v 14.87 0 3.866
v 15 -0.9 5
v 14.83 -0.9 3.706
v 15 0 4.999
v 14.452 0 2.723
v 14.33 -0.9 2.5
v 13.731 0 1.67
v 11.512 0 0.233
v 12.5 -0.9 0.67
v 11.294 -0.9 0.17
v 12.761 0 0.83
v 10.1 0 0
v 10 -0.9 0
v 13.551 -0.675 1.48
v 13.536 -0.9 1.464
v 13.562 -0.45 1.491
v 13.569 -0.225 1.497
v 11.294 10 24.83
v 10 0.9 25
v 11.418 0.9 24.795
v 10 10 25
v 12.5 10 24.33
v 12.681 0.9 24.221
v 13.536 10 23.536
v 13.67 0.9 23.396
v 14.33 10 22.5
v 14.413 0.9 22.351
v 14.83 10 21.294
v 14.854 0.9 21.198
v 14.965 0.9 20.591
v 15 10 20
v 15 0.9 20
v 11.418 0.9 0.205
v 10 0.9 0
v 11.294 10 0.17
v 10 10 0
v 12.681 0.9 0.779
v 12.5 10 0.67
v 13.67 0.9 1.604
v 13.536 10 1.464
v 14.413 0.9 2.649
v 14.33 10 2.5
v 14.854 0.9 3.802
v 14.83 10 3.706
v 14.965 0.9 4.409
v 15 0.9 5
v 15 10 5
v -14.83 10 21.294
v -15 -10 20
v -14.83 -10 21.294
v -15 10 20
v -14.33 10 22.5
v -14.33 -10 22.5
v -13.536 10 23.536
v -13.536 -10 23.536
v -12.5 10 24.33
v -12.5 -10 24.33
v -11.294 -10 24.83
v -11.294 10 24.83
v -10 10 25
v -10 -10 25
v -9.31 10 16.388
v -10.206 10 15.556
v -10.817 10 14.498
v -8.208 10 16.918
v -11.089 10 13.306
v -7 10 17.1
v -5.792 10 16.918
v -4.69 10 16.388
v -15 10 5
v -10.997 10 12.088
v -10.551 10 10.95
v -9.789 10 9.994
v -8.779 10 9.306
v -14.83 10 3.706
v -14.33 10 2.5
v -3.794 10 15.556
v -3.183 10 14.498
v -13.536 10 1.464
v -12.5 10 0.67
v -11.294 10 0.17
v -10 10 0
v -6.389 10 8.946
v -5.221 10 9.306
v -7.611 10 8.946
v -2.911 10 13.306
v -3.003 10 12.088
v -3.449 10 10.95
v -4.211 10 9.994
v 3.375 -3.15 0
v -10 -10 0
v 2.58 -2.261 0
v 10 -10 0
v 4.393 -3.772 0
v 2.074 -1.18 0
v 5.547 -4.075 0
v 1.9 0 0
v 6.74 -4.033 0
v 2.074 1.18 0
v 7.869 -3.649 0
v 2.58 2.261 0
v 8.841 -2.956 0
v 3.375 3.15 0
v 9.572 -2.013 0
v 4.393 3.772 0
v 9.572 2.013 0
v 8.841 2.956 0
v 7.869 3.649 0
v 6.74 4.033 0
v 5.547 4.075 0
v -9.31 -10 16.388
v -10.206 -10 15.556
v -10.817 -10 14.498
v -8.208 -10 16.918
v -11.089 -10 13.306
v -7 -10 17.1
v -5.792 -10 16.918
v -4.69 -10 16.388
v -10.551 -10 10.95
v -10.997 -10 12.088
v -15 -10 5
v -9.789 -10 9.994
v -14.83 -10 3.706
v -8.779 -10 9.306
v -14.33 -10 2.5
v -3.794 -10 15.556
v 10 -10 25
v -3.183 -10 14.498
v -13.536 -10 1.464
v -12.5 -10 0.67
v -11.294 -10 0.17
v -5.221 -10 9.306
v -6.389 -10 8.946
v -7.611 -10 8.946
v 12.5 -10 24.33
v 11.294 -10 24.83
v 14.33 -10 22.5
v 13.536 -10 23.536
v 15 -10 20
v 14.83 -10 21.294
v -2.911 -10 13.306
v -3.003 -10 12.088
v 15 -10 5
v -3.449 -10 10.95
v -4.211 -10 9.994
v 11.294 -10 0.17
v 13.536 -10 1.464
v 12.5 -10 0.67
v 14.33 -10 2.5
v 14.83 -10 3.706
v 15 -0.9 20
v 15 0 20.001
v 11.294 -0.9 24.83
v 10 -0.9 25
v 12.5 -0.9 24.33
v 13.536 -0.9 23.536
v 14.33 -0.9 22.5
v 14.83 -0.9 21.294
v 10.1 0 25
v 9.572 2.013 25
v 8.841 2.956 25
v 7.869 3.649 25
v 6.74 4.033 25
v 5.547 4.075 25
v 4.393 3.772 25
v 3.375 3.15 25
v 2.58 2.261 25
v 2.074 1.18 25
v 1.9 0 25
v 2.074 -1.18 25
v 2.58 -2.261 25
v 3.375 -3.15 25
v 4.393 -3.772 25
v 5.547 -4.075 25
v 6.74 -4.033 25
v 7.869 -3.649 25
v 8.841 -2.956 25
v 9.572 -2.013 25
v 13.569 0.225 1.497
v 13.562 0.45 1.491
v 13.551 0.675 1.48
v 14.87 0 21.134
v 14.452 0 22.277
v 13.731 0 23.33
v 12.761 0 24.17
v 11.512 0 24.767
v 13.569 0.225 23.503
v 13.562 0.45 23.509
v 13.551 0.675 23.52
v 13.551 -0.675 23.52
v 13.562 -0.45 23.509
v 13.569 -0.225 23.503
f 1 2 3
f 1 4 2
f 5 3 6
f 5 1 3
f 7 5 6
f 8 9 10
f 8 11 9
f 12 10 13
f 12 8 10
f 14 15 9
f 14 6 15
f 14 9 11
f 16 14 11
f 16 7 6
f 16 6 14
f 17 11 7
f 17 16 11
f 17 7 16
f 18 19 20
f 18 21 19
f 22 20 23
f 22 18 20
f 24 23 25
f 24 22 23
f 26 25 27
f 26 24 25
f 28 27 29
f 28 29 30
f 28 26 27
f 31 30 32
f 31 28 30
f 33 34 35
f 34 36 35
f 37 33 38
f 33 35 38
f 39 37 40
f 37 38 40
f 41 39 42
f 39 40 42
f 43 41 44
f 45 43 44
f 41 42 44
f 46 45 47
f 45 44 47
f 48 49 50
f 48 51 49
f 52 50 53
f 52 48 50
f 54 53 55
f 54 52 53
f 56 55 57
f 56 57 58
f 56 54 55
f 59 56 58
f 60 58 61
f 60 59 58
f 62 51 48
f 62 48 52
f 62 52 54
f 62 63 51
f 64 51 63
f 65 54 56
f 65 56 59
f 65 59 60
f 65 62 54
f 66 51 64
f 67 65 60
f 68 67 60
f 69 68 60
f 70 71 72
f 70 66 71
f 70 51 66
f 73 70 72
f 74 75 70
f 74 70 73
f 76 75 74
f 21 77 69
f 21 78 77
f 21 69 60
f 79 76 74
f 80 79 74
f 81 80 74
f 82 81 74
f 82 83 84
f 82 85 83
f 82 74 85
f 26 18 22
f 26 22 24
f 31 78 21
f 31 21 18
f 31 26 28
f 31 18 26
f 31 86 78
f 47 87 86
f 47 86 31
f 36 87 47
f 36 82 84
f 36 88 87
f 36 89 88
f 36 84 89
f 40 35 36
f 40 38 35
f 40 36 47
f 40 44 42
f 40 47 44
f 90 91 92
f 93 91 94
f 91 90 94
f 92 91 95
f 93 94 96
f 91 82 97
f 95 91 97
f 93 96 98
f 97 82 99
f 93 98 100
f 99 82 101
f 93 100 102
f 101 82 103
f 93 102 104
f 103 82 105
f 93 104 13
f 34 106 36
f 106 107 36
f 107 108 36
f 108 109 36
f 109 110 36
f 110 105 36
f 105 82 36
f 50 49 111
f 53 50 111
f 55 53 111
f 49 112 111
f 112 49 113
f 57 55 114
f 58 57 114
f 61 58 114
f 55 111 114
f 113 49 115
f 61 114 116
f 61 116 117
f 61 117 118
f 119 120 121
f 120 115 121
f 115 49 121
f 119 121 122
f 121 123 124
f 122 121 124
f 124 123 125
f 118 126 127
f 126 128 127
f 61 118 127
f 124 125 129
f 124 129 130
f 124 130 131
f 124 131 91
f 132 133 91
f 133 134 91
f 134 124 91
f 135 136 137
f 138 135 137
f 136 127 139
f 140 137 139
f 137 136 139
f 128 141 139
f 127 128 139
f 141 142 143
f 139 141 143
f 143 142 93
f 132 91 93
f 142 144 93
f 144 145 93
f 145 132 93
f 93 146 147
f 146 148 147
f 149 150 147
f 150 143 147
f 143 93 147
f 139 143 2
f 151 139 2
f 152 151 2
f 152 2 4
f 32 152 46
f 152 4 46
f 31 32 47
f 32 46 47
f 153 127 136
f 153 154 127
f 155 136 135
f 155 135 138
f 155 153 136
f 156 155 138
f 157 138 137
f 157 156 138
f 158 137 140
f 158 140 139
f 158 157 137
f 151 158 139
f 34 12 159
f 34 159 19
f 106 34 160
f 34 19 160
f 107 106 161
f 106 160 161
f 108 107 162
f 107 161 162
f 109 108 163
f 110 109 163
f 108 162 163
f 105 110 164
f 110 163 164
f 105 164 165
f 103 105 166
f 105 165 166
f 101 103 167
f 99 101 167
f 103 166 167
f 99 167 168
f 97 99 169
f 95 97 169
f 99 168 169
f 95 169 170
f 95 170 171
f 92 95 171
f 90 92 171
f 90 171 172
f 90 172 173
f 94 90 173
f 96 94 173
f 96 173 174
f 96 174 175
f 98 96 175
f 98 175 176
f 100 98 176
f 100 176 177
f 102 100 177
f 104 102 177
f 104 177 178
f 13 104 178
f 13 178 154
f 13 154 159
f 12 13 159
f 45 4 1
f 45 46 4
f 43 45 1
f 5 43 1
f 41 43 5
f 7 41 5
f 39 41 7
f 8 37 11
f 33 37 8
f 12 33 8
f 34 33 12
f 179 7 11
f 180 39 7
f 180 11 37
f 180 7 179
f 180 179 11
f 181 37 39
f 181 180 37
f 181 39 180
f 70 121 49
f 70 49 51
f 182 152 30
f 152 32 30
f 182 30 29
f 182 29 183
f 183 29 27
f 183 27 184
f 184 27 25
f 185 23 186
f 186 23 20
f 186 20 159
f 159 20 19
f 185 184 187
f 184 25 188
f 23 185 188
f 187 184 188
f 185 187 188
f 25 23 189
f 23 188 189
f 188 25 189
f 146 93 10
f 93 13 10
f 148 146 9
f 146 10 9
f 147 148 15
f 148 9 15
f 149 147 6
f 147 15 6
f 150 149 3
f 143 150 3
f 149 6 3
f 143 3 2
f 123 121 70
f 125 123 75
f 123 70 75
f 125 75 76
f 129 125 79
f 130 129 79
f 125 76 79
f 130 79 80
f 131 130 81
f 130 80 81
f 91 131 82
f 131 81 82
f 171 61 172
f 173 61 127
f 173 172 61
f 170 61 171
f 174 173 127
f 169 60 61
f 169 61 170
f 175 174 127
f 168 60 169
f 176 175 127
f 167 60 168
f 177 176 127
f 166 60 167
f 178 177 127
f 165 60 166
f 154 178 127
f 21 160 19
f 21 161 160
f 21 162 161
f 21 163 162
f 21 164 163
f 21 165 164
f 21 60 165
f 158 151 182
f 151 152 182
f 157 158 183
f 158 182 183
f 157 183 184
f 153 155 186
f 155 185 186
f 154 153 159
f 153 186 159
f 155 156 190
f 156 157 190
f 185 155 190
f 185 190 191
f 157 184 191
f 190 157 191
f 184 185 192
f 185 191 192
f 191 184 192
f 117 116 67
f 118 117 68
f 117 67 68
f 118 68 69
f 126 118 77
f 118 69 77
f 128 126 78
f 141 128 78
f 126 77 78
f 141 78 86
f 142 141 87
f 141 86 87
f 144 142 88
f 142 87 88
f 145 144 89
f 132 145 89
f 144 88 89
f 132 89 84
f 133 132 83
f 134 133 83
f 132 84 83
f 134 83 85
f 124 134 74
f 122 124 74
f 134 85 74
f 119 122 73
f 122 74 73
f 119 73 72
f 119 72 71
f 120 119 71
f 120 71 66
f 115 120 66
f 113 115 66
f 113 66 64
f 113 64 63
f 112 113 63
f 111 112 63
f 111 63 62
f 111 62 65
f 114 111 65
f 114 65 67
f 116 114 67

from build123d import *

# Parameters (mm, degrees)
SKETCH_1_W          = 30
SKETCH_1_H          = 20
EXTRUDE_1_DEPTH     = 25
SKETCH_2_R          = 4.1
CUT_EXTRUDE_1_DEPTH = 25
SKETCH_3_R          = 4.1
CUT_EXTRUDE_2_DEPTH = 25
FILLET_2_R          = 5


with BuildPart() as part:
    # 草图1 → 凸台-拉伸1 (new body)
    with BuildSketch(Plane.XY):
        Rectangle(SKETCH_1_W, SKETCH_1_H)
    extrude(amount=EXTRUDE_1_DEPTH)

    # 草图2 → 切除-拉伸1 (cut)
    with BuildSketch(Plane.XY.offset(25)):
        with Locations((6, 0)):
            Circle(SKETCH_2_R)
    extrude(amount=-CUT_EXTRUDE_1_DEPTH, mode=Mode.SUBTRACT)

    # 草图3 → 切除-拉伸2 (cut)
    with BuildSketch(Plane(origin=(0, 10, 0), x_dir=(1, 0, 0), z_dir=(0, 1, 0))):
        with Locations(Location((-7, -13, 0), (0, 0, 270))):
            Circle(SKETCH_3_R)
    extrude(amount=-CUT_EXTRUDE_2_DEPTH, mode=Mode.SUBTRACT)

    # 圆角2
    fillet_2_edges = [part.edges().sort_by_distance(p)[0] for p in [
        (-15, 0, 25),
        (15, 0, 25),
        (-15, 0, 0),
        (15, 0, 0),
    ]]
    fillet(fillet_2_edges, radius=FILLET_2_R)


solid = part.part
